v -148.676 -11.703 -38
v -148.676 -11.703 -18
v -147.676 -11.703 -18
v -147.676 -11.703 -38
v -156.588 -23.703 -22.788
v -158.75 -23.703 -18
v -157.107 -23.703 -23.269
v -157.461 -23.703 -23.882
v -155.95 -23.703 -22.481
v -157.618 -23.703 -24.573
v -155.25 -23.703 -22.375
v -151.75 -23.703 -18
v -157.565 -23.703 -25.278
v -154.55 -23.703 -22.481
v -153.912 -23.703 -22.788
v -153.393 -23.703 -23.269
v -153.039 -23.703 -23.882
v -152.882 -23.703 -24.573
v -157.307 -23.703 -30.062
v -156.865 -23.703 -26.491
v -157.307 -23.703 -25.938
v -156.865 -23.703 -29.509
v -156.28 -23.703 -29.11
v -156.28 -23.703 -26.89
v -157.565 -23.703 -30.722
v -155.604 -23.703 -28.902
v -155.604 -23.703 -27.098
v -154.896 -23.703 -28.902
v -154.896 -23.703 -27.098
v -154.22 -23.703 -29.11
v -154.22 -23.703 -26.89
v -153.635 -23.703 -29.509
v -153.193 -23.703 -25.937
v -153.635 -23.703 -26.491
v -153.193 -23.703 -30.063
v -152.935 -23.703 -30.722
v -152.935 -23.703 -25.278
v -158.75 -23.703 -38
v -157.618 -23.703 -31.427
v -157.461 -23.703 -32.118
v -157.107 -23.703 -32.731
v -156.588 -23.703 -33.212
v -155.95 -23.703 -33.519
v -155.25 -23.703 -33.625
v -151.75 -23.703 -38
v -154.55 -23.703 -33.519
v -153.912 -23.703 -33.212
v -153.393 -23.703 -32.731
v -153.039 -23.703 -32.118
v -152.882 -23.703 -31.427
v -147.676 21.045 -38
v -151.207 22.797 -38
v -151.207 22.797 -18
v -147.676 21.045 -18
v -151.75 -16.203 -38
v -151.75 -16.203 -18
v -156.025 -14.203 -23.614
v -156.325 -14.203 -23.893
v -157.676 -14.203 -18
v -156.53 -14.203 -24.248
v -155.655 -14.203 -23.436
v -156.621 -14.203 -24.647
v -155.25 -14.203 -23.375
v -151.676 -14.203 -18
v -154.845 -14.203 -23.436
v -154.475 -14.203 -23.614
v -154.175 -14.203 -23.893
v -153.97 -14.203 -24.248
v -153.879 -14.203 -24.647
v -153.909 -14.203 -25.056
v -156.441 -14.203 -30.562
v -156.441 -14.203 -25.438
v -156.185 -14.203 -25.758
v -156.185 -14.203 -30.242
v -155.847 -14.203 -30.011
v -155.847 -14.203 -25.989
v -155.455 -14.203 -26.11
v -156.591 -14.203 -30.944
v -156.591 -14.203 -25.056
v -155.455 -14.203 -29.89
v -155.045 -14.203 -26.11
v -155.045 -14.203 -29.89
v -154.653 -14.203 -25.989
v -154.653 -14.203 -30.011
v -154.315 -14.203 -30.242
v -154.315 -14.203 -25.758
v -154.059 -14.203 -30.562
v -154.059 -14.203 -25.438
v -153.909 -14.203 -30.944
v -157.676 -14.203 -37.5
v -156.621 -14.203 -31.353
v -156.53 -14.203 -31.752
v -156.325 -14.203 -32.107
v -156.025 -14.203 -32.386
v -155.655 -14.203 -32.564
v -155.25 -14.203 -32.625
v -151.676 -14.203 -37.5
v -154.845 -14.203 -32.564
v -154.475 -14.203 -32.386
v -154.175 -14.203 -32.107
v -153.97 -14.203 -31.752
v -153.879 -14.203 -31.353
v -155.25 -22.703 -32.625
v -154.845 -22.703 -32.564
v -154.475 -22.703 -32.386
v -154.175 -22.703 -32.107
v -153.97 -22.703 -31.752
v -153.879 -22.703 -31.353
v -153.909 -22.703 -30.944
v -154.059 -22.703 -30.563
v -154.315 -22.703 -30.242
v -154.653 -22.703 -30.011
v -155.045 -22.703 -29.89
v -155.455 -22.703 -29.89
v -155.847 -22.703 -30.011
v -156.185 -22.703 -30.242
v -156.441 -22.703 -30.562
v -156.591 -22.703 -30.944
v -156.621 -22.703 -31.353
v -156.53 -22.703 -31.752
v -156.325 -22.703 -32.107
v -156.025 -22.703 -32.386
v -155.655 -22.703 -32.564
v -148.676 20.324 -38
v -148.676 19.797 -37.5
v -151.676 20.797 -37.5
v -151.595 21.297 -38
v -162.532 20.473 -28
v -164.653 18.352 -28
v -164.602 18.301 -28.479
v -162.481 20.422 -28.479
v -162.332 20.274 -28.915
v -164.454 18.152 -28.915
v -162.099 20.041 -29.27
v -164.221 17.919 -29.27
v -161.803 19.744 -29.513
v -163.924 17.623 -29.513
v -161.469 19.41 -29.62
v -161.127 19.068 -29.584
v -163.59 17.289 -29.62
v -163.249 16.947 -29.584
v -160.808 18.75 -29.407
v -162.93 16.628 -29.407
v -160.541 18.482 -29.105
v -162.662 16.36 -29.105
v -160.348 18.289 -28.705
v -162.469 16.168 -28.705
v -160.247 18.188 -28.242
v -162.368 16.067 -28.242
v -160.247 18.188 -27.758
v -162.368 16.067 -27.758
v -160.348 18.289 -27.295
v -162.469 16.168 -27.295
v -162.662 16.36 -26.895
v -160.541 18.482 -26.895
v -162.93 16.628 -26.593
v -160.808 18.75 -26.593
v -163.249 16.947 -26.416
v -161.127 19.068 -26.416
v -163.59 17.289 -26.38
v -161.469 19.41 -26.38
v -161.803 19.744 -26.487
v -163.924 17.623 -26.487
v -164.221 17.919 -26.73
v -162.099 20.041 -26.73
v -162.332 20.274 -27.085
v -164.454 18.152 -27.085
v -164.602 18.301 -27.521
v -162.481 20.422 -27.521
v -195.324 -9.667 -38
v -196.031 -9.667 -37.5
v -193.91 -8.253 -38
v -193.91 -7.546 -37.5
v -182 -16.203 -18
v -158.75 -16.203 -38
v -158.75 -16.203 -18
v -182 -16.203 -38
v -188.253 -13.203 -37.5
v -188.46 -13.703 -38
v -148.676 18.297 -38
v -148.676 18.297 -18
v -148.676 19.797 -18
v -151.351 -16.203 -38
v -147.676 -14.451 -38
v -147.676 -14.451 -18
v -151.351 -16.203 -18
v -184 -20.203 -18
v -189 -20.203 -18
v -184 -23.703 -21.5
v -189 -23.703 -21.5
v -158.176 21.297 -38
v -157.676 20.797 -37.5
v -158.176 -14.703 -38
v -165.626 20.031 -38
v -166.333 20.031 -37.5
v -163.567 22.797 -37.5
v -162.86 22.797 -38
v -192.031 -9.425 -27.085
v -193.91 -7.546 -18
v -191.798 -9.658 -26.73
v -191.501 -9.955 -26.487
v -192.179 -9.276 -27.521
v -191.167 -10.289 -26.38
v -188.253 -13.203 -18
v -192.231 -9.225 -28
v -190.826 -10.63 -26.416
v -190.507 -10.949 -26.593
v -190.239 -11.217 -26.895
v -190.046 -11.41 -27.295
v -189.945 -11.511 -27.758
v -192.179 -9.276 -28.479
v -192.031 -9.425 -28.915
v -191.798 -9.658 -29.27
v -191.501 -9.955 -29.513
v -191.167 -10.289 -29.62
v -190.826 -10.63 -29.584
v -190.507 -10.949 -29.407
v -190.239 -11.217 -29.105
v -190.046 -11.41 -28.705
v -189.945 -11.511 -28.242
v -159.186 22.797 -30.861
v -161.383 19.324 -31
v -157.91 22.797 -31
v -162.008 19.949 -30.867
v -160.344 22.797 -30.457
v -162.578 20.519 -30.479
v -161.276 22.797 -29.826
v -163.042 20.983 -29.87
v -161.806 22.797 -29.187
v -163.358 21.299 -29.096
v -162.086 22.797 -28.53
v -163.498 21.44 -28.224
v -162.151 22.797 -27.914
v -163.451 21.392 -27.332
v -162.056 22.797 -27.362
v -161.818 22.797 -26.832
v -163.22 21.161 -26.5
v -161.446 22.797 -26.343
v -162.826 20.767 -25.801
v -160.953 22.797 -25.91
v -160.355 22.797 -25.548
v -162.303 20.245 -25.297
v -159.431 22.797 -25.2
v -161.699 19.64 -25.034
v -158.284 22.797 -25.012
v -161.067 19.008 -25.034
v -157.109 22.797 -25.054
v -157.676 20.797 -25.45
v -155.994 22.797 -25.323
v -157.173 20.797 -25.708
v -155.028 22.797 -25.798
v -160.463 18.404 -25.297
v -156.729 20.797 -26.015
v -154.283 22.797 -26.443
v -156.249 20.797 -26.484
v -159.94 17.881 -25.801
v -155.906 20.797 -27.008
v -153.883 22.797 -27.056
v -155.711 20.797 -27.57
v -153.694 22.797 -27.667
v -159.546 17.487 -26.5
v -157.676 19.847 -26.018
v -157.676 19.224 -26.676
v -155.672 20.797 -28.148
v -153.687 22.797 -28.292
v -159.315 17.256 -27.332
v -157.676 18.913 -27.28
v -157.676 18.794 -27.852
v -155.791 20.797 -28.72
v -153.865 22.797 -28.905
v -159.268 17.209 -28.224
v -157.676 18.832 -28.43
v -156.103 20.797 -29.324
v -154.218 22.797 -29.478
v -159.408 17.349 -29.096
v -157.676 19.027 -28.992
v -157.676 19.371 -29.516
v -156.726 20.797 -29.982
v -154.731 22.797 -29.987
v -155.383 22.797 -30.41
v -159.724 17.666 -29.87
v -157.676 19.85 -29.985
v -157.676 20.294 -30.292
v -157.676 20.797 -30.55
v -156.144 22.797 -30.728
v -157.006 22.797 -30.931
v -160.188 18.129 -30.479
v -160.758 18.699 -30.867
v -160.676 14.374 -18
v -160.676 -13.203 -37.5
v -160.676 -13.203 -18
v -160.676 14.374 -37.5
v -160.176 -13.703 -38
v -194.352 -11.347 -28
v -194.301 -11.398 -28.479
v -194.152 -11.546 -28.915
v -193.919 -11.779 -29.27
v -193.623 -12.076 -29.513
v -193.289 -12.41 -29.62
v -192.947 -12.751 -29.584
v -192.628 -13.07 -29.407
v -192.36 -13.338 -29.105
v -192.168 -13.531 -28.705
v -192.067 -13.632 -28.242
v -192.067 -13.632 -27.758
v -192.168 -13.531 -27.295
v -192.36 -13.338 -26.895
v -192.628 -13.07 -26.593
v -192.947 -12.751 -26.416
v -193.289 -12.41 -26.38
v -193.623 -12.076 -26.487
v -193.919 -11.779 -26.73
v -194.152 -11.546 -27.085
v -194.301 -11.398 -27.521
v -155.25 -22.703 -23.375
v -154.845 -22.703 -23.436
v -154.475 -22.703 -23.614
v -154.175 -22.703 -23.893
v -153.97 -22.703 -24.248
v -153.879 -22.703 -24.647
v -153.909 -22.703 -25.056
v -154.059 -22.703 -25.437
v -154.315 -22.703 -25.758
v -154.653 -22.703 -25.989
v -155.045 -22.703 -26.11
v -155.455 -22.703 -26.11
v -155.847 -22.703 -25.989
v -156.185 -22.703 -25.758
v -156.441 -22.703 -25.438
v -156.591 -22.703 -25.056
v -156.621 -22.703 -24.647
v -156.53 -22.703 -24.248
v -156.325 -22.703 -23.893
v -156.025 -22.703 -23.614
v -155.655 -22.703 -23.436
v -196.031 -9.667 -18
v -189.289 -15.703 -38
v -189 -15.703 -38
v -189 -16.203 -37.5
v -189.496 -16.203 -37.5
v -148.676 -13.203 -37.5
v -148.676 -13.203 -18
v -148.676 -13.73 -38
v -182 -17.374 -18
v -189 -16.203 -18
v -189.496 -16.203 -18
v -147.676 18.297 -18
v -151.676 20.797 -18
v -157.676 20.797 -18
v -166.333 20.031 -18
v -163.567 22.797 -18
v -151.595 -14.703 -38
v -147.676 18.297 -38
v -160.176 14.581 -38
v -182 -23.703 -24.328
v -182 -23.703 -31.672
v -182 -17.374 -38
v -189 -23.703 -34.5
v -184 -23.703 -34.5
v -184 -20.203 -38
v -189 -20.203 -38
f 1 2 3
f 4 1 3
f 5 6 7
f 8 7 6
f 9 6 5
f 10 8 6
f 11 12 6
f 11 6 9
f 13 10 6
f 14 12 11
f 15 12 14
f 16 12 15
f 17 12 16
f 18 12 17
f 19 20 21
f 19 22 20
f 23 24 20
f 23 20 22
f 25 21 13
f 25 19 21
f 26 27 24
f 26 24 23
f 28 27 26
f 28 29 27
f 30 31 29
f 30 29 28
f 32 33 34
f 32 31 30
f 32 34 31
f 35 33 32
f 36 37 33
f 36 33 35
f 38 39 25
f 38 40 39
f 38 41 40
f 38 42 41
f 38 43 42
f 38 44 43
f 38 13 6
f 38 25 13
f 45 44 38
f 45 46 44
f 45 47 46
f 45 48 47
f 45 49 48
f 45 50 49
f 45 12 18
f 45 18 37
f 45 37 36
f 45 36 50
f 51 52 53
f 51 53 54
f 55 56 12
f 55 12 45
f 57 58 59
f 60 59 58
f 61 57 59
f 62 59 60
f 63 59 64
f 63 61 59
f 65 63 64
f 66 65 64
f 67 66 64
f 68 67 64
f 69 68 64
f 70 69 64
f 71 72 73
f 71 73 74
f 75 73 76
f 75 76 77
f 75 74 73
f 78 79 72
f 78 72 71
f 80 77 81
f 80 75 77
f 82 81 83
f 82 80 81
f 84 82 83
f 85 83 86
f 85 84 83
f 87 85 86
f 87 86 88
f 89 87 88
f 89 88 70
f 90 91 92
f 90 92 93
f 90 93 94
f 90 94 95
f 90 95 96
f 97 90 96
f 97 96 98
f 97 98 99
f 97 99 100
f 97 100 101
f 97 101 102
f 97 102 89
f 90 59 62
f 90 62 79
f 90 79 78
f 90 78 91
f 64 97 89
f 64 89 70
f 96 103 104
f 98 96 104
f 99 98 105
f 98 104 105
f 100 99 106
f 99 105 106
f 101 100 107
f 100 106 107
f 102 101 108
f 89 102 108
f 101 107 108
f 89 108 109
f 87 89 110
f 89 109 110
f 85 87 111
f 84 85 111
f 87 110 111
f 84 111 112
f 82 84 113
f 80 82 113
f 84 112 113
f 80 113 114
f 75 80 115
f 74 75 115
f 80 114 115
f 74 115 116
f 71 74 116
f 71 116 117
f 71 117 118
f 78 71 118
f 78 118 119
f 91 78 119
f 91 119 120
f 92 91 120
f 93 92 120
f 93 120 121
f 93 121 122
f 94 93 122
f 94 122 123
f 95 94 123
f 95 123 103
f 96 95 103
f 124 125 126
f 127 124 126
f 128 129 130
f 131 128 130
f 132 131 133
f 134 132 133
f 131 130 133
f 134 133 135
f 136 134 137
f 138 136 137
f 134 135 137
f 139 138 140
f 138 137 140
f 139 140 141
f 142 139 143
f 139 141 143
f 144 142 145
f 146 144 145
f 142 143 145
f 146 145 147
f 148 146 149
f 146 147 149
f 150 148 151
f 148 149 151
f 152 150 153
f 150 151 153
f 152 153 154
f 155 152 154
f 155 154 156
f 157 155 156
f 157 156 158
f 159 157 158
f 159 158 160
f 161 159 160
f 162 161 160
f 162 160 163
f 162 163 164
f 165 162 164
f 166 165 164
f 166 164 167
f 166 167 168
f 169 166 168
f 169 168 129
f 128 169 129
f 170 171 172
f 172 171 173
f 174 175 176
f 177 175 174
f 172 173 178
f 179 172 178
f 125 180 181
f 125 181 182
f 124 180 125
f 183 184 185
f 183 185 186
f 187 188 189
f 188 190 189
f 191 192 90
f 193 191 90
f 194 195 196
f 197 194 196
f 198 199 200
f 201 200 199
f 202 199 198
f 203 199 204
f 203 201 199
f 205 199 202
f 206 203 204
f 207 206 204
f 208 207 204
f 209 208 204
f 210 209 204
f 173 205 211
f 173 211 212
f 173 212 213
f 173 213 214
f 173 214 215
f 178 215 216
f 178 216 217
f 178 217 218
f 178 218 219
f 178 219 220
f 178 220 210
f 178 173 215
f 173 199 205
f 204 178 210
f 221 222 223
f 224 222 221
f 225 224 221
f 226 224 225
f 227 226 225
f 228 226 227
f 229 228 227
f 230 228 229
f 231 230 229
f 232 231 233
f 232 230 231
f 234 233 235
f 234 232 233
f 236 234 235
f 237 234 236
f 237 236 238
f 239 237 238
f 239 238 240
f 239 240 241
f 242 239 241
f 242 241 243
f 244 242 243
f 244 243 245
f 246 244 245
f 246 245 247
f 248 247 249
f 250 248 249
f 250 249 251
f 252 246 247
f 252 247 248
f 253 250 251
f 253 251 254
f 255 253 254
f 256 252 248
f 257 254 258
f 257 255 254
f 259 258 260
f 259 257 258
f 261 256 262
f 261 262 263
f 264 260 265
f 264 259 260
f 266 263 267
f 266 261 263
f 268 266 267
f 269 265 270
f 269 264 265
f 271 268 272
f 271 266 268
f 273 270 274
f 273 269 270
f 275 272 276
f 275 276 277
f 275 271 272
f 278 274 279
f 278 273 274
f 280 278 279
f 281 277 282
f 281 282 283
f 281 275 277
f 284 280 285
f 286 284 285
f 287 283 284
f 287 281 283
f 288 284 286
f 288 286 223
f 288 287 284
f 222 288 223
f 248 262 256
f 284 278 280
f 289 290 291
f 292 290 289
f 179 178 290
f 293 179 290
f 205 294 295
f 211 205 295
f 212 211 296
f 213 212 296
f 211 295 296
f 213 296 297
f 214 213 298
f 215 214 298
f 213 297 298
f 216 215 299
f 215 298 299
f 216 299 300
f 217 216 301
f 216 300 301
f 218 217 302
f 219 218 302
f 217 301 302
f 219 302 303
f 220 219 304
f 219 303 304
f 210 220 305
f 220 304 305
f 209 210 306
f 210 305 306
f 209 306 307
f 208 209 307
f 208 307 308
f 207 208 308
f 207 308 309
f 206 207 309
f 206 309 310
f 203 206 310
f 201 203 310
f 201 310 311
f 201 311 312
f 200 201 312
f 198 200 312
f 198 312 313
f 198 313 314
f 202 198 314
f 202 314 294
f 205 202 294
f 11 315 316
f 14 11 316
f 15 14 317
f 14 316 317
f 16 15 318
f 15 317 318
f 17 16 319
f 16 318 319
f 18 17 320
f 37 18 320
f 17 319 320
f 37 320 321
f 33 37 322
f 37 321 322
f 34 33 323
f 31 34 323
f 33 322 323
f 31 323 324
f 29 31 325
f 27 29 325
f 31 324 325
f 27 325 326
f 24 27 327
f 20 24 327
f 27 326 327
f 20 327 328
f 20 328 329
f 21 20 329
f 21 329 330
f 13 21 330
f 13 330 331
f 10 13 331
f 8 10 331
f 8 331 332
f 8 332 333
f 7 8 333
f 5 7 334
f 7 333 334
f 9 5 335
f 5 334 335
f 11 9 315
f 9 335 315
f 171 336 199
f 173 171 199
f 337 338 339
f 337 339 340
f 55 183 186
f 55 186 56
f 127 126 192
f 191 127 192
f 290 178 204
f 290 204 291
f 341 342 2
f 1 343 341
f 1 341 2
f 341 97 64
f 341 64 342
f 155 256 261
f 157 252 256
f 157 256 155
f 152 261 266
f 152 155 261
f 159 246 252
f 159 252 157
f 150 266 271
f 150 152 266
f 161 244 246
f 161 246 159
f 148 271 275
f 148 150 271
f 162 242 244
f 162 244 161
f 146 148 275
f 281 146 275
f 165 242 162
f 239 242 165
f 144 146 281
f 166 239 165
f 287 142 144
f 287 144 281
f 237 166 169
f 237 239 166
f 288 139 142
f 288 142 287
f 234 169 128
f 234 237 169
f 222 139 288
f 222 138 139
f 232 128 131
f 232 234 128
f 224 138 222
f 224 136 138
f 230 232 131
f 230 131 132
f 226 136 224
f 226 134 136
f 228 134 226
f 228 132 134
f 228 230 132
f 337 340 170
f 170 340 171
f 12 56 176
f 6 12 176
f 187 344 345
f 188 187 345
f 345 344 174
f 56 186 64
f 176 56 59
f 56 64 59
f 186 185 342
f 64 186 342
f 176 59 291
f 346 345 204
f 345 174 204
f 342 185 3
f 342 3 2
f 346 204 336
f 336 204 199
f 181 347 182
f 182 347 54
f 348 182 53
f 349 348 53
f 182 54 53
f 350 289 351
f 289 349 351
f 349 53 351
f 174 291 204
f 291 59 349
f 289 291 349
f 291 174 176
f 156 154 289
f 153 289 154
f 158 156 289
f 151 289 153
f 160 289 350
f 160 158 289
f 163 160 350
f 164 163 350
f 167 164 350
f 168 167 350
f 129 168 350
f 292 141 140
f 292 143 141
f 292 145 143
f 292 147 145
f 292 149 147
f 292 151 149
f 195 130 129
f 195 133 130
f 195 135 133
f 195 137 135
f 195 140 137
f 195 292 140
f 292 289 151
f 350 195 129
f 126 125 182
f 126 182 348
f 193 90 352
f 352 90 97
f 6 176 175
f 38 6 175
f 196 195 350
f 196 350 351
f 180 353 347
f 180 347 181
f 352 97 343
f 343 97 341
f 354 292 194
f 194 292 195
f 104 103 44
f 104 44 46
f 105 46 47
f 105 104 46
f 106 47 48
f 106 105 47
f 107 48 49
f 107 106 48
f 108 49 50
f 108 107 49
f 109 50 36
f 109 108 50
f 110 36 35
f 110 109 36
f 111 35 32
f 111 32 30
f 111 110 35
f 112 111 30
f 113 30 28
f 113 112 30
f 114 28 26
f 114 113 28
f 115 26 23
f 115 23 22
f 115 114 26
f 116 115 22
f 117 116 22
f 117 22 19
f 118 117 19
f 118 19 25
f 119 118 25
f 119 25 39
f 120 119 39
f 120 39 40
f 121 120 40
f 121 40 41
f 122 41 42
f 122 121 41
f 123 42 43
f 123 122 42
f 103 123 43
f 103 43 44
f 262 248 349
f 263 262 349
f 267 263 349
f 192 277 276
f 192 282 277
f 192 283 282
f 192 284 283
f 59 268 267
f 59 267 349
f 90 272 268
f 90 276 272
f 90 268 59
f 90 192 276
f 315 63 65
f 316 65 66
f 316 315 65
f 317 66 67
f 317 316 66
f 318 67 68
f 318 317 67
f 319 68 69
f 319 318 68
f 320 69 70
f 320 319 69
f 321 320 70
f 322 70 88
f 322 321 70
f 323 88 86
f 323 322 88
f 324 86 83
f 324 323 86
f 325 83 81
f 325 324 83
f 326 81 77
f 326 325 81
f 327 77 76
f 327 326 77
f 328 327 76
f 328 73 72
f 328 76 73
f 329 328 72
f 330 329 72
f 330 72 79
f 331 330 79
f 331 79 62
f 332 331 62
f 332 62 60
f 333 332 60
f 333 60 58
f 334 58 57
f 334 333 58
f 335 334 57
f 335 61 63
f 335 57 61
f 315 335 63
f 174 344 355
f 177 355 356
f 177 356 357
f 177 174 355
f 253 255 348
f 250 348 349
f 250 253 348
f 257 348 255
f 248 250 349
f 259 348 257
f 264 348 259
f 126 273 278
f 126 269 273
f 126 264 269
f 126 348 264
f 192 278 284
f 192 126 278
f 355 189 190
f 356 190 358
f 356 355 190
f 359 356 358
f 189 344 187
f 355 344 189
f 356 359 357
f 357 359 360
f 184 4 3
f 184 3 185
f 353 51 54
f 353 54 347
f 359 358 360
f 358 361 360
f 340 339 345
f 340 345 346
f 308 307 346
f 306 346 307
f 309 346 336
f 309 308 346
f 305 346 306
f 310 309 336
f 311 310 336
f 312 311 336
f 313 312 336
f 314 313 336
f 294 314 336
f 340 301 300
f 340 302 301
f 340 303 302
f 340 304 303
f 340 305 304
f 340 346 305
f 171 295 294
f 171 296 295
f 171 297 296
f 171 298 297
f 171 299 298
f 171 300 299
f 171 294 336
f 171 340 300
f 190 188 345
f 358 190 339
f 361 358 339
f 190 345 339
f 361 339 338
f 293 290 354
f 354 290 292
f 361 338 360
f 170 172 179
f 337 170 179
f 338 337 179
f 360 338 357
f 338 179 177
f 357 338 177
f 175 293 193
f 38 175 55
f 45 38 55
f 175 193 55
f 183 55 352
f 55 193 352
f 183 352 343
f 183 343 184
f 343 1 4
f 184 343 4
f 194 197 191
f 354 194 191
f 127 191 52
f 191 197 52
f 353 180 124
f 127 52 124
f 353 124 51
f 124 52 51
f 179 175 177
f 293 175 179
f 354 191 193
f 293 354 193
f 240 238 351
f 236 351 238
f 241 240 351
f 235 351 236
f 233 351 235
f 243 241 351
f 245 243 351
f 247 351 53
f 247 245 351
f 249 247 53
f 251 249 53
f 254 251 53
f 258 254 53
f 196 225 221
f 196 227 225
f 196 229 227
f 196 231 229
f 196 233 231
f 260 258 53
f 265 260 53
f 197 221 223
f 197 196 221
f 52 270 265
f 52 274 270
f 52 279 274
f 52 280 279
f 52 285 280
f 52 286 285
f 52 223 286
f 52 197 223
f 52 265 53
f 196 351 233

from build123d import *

# Parameters (mm, degrees)
CYLINDER003_R            = 3
CYLINDER003_DEPTH        = 10
PAD008_DEPTH             = 10
SKETCH032_R              = 1.625
POCKET023_DEPTH          = 55.910244
SKETCH033_W              = 20
SKETCH033_H              = 7
PAD009_DEPTH             = 7.5
SKETCH034_R              = 1.375
POCKET024_DEPTH          = 12
CHAMFER020_1_SIZE        = 3.5
CHAMFER020_2_SIZE        = 1
CHAMFER021_SIZE          = 0.5
CHAMFER022_SIZE          = 2
CLONE006_PITCH_ANGLE     = 90
CLONE006_PLACEMENT_ANGLE = 45.000049


with BuildPart() as boardbracketscrewheadcylinder:
    # Cylinder003 → Cylinder003 (new body)
    with BuildSketch(Plane(origin=(0, 0.5, 24), x_dir=(1, 0, 0), z_dir=(0, 0, 1))):
        Circle(CYLINDER003_R)
    extrude(amount=CYLINDER003_DEPTH)


with BuildPart() as clone006:
    # Sketch031 → Pad008 (new body, symmetric)
    with BuildSketch(Plane.YZ):
        Polygon((4.5, 21), (4.5, 24.911688), (-4.23971, 33.651398), (-7.975533, 34.909244), (-9.918525, 32.966252), (-9.211418, 32.259145), (-8.150758, 33.319805), (-5.32233, 31.905592), (-1.07969, 27.662951), (-25.828427, 2.914214), (-30.071068, 7.156854), (-31.485281, 9.985281), (-30.424621, 11.045942), (-31.131728, 11.753048), (-33.07472, 9.810056), (-31.714777, 5.972136), (-4.742641, -21), (4.5, -21), (4.5, -18), (-3.5, -18), (-23, 1.5), (-3.5, 21), align=None)
    extrude(amount=PAD008_DEPTH, both=True)

    # Sketch032 → Pocket023 (cut, through all)
    with BuildSketch(Plane.YX.offset(21)):
        with Locations((0.5, 0)):
            Circle(SKETCH032_R)
    extrude(amount=-POCKET023_DEPTH, mode=Mode.SUBTRACT)

    # Cut001: cut BoardBracketScrewHeadCylinder
    add(boardbracketscrewheadcylinder.part, mode=Mode.SUBTRACT)

    # Sketch033 → Pad009 (new body)
    with BuildSketch(Plane(origin=(0, -12.87132, -12.87132), x_dir=(1, 0, 0), z_dir=(0, -0.707107, -0.707107))):
        with Locations((0, 22.75)):
            Rectangle(SKETCH033_W, SKETCH033_H)
        with Locations((0, -7.5)):
            Rectangle(SKETCH033_W, SKETCH033_H)
    extrude(amount=PAD009_DEPTH)

    # Sketch034 → Pocket024 (cut)
    with BuildSketch(Plane(origin=(0, -18.174621, -18.174621), x_dir=(1, 0, 0), z_dir=(0, -0.707107, -0.707107))):
        with Locations((3.25, 22.75)):
            Circle(SKETCH034_R)
    pocket024 = extrude(amount=-POCKET024_DEPTH, mode=Mode.SUBTRACT)

    # Mirrored002: Pocket024 across Sketch034 V_Axis
    add(pocket024.mirror(Plane(origin=(0, -18.174621, -18.174621), x_dir=(0, -0.707107, -0.707107), z_dir=(1, 0, 0))), mode=Mode.SUBTRACT)

    # Chamfer020 1
    chamfer020_1_edges = [clone006.edges().sort_by_distance(p)[0] for p in [
        (-10, -12.87132, -23.477922),
        (10, -12.87132, -23.477922),
    ]]
    chamfer(chamfer020_1_edges, length=CHAMFER020_1_SIZE)

    # Chamfer020 2
    chamfer020_2_edges = [clone006.edges().sort_by_distance(p)[0] for p in [
        (-1.875, -34.2613, -2.087942),
        (1.875, -34.2613, -2.087942),
    ]]
    chamfer(chamfer020_2_edges, length=CHAMFER020_2_SIZE)

    # Chamfer021
    chamfer021_edges = [clone006.edges().sort_by_distance(p)[0] for p in [
        (10, -4.917893, -20.824747),
        (10, -0.12132, -21),
        (10, 4.5, -19.5),
        (10, 0.5, -18),
        (10, -13.25, -8.25),
        (10, -13.25, 11.25),
        (10, 0.5, 21),
        (10, 4.5, 22.955844),
        (10, -30.778175, 8.571068),
        (10, -27.949747, 5.035534),
        (10, -13.454058, 15.288582),
        (10, -3.20101, 29.784271),
        (10, -6.736544, 32.612698),
    ]]
    chamfer(chamfer021_edges, length=CHAMFER021_SIZE)

    # Chamfer022
    chamfer022_edges = [clone006.edges().sort_by_distance(p)[0] for p in [
        (8.25, -14.108757, -19.765611),
        (-8.25, -14.108757, -19.765611),
    ]]
    chamfer(chamfer022_edges, length=CHAMFER022_SIZE)


with BuildPart() as clone006_1:
    # Clone006 pitch: moved
    add(clone006.part.rotate(Axis((0, 0, 0), (0, 1, 0)), CLONE006_PITCH_ANGLE))


with BuildPart() as clone006_2:
    # Clone006 placement: moved
    add(clone006_1.part.moved(Location((-178, 2, -28))).rotate(Axis((-178, 2, -28), (0, 0, 1)), CLONE006_PLACEMENT_ANGLE))


solid = clone006_2.part
